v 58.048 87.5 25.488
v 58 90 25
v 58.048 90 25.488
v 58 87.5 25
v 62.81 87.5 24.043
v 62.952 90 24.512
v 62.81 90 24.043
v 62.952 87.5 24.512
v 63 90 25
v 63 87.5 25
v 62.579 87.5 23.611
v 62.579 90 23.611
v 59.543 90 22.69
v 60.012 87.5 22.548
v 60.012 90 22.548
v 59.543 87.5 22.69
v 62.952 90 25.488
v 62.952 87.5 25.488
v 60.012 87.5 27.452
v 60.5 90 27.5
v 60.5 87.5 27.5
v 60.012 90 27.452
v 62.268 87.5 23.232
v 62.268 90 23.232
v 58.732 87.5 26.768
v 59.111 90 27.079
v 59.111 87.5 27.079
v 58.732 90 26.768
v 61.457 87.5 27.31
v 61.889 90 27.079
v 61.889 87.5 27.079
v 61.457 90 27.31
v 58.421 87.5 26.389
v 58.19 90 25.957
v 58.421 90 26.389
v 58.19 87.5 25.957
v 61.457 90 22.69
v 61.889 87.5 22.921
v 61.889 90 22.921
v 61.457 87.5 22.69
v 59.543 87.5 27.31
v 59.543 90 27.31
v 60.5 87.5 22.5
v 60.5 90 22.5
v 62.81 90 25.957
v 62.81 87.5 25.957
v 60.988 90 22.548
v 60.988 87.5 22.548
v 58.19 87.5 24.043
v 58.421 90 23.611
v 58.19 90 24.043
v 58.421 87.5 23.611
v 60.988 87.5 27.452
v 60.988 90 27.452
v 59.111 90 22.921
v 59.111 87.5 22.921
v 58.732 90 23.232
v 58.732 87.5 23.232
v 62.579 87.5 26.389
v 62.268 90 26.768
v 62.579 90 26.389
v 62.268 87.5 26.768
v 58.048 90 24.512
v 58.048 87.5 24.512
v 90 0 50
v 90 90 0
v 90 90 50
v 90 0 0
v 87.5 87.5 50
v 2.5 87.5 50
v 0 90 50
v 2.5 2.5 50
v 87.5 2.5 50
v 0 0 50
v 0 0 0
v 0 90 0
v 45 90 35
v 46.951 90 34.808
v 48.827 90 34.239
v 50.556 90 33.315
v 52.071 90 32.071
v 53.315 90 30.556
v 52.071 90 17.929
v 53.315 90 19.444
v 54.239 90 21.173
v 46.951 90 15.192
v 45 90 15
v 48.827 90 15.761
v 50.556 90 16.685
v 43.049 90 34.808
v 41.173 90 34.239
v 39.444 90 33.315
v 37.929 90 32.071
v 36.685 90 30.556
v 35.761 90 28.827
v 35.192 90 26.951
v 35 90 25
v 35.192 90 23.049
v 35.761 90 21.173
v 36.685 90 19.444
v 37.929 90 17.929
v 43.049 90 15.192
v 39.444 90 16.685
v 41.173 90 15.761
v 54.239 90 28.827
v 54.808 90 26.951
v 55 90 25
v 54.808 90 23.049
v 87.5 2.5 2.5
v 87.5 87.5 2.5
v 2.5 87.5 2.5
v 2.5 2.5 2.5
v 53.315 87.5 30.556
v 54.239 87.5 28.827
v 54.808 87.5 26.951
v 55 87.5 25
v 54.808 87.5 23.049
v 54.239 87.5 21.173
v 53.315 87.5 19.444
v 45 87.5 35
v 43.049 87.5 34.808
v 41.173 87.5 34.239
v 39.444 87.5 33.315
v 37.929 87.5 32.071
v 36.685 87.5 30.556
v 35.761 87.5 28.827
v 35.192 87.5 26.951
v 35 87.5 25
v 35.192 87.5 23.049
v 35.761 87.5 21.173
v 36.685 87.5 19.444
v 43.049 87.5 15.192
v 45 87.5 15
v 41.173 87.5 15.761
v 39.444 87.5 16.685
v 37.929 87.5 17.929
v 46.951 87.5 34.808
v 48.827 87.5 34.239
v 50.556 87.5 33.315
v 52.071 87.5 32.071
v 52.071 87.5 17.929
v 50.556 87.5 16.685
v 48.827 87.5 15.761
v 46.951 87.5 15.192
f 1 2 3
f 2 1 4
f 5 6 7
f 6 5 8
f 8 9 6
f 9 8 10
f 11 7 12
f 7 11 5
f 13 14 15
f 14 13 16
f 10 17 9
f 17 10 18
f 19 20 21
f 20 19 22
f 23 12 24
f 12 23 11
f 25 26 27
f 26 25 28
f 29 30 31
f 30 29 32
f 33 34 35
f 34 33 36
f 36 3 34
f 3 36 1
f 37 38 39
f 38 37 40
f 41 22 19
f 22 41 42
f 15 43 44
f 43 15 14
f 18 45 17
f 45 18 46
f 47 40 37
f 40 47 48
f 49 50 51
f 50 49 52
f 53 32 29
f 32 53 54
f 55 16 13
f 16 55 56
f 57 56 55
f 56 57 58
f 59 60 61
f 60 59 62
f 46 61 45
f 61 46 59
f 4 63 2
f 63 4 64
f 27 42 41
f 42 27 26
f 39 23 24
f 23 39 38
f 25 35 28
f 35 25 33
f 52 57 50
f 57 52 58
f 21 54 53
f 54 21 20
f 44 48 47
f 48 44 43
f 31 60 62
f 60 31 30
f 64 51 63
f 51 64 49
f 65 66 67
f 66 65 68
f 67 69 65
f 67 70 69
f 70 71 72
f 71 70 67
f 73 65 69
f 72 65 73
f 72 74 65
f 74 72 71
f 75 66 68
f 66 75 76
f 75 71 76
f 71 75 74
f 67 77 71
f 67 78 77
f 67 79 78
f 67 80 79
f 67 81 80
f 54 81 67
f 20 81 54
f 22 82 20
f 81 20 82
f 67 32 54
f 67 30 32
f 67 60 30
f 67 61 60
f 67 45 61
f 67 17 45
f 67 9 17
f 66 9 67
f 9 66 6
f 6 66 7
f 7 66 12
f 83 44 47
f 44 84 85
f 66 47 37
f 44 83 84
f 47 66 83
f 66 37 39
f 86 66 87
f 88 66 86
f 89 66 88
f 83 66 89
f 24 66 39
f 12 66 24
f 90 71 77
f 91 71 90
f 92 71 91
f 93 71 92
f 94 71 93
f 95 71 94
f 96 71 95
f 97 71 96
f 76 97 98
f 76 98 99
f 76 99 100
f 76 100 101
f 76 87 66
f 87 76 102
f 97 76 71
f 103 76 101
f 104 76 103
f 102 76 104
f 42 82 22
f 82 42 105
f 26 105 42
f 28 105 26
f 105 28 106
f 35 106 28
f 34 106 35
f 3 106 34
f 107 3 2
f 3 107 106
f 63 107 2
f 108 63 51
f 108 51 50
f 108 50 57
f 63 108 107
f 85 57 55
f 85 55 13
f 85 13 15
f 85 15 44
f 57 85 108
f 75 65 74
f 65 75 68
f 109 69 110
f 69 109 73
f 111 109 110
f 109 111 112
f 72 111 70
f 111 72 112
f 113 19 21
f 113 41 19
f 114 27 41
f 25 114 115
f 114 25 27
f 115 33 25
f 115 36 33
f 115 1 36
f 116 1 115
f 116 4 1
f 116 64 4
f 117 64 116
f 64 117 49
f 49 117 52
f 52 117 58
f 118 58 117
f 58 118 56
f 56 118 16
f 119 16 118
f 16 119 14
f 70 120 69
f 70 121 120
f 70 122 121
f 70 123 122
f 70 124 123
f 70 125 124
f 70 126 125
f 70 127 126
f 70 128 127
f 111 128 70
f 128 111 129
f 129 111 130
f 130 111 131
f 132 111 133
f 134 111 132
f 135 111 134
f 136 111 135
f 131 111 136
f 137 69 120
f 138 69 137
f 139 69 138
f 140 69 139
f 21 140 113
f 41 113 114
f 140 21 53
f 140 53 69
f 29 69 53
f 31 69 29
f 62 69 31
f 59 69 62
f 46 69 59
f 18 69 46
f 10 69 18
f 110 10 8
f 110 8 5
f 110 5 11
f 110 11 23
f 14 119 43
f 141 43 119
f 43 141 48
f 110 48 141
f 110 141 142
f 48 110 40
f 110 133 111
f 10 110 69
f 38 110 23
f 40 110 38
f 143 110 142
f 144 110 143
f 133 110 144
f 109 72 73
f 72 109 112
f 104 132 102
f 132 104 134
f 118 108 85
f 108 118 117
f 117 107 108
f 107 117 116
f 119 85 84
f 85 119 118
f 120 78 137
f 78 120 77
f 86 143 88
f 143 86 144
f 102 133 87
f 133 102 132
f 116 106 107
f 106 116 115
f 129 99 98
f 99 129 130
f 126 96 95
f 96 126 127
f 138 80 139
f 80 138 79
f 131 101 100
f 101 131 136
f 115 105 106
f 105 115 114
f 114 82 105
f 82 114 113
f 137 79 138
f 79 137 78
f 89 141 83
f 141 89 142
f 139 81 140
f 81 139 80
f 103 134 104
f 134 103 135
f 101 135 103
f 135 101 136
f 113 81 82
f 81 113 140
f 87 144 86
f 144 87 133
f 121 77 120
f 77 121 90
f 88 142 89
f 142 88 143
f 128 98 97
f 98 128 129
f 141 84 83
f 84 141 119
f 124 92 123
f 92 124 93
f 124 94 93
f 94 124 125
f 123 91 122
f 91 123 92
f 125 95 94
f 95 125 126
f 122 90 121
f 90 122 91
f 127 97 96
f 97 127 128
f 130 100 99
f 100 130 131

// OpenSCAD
$fn = 32;

// ----------------------------------------------------------------------
// Vent box: roundvent enclosure
// ----------------------------------------------------------------------

// --- parameters (mm) ---
box_l = 90;               // box length, X
box_w = 90;               // box width, Y
box_h = 50;               // box height, Z
wall_t = 2.5;             // shell wall thickness
vent_d = 20;              // central vent diameter
ring_d = 5;               // ring hole diameter
n_ring = 6;               // holes in the ring
ring_r = 15.5;            // ring radius

ring_step = 360 / n_ring;  // ring hole angular step

difference() {
  cube([box_l, box_w, box_h]);
  translate([wall_t, wall_t, wall_t])
    cube([box_l - 2 * wall_t, box_w - 2 * wall_t, box_h]);
  translate([box_l / 2, box_w - wall_t - 1, box_h / 2])
    rotate([-90, 0, 0]) cylinder(h = wall_t + 2, d = vent_d);
  for (i = [0 : n_ring - 1])
    translate([box_l / 2, box_w - wall_t - 1, box_h / 2])
      rotate([0, 0, i * ring_step])
        translate([ring_r, 0, 0]) rotate([-90, 0, 0])
          cylinder(h = wall_t + 2, d = ring_d);
}
